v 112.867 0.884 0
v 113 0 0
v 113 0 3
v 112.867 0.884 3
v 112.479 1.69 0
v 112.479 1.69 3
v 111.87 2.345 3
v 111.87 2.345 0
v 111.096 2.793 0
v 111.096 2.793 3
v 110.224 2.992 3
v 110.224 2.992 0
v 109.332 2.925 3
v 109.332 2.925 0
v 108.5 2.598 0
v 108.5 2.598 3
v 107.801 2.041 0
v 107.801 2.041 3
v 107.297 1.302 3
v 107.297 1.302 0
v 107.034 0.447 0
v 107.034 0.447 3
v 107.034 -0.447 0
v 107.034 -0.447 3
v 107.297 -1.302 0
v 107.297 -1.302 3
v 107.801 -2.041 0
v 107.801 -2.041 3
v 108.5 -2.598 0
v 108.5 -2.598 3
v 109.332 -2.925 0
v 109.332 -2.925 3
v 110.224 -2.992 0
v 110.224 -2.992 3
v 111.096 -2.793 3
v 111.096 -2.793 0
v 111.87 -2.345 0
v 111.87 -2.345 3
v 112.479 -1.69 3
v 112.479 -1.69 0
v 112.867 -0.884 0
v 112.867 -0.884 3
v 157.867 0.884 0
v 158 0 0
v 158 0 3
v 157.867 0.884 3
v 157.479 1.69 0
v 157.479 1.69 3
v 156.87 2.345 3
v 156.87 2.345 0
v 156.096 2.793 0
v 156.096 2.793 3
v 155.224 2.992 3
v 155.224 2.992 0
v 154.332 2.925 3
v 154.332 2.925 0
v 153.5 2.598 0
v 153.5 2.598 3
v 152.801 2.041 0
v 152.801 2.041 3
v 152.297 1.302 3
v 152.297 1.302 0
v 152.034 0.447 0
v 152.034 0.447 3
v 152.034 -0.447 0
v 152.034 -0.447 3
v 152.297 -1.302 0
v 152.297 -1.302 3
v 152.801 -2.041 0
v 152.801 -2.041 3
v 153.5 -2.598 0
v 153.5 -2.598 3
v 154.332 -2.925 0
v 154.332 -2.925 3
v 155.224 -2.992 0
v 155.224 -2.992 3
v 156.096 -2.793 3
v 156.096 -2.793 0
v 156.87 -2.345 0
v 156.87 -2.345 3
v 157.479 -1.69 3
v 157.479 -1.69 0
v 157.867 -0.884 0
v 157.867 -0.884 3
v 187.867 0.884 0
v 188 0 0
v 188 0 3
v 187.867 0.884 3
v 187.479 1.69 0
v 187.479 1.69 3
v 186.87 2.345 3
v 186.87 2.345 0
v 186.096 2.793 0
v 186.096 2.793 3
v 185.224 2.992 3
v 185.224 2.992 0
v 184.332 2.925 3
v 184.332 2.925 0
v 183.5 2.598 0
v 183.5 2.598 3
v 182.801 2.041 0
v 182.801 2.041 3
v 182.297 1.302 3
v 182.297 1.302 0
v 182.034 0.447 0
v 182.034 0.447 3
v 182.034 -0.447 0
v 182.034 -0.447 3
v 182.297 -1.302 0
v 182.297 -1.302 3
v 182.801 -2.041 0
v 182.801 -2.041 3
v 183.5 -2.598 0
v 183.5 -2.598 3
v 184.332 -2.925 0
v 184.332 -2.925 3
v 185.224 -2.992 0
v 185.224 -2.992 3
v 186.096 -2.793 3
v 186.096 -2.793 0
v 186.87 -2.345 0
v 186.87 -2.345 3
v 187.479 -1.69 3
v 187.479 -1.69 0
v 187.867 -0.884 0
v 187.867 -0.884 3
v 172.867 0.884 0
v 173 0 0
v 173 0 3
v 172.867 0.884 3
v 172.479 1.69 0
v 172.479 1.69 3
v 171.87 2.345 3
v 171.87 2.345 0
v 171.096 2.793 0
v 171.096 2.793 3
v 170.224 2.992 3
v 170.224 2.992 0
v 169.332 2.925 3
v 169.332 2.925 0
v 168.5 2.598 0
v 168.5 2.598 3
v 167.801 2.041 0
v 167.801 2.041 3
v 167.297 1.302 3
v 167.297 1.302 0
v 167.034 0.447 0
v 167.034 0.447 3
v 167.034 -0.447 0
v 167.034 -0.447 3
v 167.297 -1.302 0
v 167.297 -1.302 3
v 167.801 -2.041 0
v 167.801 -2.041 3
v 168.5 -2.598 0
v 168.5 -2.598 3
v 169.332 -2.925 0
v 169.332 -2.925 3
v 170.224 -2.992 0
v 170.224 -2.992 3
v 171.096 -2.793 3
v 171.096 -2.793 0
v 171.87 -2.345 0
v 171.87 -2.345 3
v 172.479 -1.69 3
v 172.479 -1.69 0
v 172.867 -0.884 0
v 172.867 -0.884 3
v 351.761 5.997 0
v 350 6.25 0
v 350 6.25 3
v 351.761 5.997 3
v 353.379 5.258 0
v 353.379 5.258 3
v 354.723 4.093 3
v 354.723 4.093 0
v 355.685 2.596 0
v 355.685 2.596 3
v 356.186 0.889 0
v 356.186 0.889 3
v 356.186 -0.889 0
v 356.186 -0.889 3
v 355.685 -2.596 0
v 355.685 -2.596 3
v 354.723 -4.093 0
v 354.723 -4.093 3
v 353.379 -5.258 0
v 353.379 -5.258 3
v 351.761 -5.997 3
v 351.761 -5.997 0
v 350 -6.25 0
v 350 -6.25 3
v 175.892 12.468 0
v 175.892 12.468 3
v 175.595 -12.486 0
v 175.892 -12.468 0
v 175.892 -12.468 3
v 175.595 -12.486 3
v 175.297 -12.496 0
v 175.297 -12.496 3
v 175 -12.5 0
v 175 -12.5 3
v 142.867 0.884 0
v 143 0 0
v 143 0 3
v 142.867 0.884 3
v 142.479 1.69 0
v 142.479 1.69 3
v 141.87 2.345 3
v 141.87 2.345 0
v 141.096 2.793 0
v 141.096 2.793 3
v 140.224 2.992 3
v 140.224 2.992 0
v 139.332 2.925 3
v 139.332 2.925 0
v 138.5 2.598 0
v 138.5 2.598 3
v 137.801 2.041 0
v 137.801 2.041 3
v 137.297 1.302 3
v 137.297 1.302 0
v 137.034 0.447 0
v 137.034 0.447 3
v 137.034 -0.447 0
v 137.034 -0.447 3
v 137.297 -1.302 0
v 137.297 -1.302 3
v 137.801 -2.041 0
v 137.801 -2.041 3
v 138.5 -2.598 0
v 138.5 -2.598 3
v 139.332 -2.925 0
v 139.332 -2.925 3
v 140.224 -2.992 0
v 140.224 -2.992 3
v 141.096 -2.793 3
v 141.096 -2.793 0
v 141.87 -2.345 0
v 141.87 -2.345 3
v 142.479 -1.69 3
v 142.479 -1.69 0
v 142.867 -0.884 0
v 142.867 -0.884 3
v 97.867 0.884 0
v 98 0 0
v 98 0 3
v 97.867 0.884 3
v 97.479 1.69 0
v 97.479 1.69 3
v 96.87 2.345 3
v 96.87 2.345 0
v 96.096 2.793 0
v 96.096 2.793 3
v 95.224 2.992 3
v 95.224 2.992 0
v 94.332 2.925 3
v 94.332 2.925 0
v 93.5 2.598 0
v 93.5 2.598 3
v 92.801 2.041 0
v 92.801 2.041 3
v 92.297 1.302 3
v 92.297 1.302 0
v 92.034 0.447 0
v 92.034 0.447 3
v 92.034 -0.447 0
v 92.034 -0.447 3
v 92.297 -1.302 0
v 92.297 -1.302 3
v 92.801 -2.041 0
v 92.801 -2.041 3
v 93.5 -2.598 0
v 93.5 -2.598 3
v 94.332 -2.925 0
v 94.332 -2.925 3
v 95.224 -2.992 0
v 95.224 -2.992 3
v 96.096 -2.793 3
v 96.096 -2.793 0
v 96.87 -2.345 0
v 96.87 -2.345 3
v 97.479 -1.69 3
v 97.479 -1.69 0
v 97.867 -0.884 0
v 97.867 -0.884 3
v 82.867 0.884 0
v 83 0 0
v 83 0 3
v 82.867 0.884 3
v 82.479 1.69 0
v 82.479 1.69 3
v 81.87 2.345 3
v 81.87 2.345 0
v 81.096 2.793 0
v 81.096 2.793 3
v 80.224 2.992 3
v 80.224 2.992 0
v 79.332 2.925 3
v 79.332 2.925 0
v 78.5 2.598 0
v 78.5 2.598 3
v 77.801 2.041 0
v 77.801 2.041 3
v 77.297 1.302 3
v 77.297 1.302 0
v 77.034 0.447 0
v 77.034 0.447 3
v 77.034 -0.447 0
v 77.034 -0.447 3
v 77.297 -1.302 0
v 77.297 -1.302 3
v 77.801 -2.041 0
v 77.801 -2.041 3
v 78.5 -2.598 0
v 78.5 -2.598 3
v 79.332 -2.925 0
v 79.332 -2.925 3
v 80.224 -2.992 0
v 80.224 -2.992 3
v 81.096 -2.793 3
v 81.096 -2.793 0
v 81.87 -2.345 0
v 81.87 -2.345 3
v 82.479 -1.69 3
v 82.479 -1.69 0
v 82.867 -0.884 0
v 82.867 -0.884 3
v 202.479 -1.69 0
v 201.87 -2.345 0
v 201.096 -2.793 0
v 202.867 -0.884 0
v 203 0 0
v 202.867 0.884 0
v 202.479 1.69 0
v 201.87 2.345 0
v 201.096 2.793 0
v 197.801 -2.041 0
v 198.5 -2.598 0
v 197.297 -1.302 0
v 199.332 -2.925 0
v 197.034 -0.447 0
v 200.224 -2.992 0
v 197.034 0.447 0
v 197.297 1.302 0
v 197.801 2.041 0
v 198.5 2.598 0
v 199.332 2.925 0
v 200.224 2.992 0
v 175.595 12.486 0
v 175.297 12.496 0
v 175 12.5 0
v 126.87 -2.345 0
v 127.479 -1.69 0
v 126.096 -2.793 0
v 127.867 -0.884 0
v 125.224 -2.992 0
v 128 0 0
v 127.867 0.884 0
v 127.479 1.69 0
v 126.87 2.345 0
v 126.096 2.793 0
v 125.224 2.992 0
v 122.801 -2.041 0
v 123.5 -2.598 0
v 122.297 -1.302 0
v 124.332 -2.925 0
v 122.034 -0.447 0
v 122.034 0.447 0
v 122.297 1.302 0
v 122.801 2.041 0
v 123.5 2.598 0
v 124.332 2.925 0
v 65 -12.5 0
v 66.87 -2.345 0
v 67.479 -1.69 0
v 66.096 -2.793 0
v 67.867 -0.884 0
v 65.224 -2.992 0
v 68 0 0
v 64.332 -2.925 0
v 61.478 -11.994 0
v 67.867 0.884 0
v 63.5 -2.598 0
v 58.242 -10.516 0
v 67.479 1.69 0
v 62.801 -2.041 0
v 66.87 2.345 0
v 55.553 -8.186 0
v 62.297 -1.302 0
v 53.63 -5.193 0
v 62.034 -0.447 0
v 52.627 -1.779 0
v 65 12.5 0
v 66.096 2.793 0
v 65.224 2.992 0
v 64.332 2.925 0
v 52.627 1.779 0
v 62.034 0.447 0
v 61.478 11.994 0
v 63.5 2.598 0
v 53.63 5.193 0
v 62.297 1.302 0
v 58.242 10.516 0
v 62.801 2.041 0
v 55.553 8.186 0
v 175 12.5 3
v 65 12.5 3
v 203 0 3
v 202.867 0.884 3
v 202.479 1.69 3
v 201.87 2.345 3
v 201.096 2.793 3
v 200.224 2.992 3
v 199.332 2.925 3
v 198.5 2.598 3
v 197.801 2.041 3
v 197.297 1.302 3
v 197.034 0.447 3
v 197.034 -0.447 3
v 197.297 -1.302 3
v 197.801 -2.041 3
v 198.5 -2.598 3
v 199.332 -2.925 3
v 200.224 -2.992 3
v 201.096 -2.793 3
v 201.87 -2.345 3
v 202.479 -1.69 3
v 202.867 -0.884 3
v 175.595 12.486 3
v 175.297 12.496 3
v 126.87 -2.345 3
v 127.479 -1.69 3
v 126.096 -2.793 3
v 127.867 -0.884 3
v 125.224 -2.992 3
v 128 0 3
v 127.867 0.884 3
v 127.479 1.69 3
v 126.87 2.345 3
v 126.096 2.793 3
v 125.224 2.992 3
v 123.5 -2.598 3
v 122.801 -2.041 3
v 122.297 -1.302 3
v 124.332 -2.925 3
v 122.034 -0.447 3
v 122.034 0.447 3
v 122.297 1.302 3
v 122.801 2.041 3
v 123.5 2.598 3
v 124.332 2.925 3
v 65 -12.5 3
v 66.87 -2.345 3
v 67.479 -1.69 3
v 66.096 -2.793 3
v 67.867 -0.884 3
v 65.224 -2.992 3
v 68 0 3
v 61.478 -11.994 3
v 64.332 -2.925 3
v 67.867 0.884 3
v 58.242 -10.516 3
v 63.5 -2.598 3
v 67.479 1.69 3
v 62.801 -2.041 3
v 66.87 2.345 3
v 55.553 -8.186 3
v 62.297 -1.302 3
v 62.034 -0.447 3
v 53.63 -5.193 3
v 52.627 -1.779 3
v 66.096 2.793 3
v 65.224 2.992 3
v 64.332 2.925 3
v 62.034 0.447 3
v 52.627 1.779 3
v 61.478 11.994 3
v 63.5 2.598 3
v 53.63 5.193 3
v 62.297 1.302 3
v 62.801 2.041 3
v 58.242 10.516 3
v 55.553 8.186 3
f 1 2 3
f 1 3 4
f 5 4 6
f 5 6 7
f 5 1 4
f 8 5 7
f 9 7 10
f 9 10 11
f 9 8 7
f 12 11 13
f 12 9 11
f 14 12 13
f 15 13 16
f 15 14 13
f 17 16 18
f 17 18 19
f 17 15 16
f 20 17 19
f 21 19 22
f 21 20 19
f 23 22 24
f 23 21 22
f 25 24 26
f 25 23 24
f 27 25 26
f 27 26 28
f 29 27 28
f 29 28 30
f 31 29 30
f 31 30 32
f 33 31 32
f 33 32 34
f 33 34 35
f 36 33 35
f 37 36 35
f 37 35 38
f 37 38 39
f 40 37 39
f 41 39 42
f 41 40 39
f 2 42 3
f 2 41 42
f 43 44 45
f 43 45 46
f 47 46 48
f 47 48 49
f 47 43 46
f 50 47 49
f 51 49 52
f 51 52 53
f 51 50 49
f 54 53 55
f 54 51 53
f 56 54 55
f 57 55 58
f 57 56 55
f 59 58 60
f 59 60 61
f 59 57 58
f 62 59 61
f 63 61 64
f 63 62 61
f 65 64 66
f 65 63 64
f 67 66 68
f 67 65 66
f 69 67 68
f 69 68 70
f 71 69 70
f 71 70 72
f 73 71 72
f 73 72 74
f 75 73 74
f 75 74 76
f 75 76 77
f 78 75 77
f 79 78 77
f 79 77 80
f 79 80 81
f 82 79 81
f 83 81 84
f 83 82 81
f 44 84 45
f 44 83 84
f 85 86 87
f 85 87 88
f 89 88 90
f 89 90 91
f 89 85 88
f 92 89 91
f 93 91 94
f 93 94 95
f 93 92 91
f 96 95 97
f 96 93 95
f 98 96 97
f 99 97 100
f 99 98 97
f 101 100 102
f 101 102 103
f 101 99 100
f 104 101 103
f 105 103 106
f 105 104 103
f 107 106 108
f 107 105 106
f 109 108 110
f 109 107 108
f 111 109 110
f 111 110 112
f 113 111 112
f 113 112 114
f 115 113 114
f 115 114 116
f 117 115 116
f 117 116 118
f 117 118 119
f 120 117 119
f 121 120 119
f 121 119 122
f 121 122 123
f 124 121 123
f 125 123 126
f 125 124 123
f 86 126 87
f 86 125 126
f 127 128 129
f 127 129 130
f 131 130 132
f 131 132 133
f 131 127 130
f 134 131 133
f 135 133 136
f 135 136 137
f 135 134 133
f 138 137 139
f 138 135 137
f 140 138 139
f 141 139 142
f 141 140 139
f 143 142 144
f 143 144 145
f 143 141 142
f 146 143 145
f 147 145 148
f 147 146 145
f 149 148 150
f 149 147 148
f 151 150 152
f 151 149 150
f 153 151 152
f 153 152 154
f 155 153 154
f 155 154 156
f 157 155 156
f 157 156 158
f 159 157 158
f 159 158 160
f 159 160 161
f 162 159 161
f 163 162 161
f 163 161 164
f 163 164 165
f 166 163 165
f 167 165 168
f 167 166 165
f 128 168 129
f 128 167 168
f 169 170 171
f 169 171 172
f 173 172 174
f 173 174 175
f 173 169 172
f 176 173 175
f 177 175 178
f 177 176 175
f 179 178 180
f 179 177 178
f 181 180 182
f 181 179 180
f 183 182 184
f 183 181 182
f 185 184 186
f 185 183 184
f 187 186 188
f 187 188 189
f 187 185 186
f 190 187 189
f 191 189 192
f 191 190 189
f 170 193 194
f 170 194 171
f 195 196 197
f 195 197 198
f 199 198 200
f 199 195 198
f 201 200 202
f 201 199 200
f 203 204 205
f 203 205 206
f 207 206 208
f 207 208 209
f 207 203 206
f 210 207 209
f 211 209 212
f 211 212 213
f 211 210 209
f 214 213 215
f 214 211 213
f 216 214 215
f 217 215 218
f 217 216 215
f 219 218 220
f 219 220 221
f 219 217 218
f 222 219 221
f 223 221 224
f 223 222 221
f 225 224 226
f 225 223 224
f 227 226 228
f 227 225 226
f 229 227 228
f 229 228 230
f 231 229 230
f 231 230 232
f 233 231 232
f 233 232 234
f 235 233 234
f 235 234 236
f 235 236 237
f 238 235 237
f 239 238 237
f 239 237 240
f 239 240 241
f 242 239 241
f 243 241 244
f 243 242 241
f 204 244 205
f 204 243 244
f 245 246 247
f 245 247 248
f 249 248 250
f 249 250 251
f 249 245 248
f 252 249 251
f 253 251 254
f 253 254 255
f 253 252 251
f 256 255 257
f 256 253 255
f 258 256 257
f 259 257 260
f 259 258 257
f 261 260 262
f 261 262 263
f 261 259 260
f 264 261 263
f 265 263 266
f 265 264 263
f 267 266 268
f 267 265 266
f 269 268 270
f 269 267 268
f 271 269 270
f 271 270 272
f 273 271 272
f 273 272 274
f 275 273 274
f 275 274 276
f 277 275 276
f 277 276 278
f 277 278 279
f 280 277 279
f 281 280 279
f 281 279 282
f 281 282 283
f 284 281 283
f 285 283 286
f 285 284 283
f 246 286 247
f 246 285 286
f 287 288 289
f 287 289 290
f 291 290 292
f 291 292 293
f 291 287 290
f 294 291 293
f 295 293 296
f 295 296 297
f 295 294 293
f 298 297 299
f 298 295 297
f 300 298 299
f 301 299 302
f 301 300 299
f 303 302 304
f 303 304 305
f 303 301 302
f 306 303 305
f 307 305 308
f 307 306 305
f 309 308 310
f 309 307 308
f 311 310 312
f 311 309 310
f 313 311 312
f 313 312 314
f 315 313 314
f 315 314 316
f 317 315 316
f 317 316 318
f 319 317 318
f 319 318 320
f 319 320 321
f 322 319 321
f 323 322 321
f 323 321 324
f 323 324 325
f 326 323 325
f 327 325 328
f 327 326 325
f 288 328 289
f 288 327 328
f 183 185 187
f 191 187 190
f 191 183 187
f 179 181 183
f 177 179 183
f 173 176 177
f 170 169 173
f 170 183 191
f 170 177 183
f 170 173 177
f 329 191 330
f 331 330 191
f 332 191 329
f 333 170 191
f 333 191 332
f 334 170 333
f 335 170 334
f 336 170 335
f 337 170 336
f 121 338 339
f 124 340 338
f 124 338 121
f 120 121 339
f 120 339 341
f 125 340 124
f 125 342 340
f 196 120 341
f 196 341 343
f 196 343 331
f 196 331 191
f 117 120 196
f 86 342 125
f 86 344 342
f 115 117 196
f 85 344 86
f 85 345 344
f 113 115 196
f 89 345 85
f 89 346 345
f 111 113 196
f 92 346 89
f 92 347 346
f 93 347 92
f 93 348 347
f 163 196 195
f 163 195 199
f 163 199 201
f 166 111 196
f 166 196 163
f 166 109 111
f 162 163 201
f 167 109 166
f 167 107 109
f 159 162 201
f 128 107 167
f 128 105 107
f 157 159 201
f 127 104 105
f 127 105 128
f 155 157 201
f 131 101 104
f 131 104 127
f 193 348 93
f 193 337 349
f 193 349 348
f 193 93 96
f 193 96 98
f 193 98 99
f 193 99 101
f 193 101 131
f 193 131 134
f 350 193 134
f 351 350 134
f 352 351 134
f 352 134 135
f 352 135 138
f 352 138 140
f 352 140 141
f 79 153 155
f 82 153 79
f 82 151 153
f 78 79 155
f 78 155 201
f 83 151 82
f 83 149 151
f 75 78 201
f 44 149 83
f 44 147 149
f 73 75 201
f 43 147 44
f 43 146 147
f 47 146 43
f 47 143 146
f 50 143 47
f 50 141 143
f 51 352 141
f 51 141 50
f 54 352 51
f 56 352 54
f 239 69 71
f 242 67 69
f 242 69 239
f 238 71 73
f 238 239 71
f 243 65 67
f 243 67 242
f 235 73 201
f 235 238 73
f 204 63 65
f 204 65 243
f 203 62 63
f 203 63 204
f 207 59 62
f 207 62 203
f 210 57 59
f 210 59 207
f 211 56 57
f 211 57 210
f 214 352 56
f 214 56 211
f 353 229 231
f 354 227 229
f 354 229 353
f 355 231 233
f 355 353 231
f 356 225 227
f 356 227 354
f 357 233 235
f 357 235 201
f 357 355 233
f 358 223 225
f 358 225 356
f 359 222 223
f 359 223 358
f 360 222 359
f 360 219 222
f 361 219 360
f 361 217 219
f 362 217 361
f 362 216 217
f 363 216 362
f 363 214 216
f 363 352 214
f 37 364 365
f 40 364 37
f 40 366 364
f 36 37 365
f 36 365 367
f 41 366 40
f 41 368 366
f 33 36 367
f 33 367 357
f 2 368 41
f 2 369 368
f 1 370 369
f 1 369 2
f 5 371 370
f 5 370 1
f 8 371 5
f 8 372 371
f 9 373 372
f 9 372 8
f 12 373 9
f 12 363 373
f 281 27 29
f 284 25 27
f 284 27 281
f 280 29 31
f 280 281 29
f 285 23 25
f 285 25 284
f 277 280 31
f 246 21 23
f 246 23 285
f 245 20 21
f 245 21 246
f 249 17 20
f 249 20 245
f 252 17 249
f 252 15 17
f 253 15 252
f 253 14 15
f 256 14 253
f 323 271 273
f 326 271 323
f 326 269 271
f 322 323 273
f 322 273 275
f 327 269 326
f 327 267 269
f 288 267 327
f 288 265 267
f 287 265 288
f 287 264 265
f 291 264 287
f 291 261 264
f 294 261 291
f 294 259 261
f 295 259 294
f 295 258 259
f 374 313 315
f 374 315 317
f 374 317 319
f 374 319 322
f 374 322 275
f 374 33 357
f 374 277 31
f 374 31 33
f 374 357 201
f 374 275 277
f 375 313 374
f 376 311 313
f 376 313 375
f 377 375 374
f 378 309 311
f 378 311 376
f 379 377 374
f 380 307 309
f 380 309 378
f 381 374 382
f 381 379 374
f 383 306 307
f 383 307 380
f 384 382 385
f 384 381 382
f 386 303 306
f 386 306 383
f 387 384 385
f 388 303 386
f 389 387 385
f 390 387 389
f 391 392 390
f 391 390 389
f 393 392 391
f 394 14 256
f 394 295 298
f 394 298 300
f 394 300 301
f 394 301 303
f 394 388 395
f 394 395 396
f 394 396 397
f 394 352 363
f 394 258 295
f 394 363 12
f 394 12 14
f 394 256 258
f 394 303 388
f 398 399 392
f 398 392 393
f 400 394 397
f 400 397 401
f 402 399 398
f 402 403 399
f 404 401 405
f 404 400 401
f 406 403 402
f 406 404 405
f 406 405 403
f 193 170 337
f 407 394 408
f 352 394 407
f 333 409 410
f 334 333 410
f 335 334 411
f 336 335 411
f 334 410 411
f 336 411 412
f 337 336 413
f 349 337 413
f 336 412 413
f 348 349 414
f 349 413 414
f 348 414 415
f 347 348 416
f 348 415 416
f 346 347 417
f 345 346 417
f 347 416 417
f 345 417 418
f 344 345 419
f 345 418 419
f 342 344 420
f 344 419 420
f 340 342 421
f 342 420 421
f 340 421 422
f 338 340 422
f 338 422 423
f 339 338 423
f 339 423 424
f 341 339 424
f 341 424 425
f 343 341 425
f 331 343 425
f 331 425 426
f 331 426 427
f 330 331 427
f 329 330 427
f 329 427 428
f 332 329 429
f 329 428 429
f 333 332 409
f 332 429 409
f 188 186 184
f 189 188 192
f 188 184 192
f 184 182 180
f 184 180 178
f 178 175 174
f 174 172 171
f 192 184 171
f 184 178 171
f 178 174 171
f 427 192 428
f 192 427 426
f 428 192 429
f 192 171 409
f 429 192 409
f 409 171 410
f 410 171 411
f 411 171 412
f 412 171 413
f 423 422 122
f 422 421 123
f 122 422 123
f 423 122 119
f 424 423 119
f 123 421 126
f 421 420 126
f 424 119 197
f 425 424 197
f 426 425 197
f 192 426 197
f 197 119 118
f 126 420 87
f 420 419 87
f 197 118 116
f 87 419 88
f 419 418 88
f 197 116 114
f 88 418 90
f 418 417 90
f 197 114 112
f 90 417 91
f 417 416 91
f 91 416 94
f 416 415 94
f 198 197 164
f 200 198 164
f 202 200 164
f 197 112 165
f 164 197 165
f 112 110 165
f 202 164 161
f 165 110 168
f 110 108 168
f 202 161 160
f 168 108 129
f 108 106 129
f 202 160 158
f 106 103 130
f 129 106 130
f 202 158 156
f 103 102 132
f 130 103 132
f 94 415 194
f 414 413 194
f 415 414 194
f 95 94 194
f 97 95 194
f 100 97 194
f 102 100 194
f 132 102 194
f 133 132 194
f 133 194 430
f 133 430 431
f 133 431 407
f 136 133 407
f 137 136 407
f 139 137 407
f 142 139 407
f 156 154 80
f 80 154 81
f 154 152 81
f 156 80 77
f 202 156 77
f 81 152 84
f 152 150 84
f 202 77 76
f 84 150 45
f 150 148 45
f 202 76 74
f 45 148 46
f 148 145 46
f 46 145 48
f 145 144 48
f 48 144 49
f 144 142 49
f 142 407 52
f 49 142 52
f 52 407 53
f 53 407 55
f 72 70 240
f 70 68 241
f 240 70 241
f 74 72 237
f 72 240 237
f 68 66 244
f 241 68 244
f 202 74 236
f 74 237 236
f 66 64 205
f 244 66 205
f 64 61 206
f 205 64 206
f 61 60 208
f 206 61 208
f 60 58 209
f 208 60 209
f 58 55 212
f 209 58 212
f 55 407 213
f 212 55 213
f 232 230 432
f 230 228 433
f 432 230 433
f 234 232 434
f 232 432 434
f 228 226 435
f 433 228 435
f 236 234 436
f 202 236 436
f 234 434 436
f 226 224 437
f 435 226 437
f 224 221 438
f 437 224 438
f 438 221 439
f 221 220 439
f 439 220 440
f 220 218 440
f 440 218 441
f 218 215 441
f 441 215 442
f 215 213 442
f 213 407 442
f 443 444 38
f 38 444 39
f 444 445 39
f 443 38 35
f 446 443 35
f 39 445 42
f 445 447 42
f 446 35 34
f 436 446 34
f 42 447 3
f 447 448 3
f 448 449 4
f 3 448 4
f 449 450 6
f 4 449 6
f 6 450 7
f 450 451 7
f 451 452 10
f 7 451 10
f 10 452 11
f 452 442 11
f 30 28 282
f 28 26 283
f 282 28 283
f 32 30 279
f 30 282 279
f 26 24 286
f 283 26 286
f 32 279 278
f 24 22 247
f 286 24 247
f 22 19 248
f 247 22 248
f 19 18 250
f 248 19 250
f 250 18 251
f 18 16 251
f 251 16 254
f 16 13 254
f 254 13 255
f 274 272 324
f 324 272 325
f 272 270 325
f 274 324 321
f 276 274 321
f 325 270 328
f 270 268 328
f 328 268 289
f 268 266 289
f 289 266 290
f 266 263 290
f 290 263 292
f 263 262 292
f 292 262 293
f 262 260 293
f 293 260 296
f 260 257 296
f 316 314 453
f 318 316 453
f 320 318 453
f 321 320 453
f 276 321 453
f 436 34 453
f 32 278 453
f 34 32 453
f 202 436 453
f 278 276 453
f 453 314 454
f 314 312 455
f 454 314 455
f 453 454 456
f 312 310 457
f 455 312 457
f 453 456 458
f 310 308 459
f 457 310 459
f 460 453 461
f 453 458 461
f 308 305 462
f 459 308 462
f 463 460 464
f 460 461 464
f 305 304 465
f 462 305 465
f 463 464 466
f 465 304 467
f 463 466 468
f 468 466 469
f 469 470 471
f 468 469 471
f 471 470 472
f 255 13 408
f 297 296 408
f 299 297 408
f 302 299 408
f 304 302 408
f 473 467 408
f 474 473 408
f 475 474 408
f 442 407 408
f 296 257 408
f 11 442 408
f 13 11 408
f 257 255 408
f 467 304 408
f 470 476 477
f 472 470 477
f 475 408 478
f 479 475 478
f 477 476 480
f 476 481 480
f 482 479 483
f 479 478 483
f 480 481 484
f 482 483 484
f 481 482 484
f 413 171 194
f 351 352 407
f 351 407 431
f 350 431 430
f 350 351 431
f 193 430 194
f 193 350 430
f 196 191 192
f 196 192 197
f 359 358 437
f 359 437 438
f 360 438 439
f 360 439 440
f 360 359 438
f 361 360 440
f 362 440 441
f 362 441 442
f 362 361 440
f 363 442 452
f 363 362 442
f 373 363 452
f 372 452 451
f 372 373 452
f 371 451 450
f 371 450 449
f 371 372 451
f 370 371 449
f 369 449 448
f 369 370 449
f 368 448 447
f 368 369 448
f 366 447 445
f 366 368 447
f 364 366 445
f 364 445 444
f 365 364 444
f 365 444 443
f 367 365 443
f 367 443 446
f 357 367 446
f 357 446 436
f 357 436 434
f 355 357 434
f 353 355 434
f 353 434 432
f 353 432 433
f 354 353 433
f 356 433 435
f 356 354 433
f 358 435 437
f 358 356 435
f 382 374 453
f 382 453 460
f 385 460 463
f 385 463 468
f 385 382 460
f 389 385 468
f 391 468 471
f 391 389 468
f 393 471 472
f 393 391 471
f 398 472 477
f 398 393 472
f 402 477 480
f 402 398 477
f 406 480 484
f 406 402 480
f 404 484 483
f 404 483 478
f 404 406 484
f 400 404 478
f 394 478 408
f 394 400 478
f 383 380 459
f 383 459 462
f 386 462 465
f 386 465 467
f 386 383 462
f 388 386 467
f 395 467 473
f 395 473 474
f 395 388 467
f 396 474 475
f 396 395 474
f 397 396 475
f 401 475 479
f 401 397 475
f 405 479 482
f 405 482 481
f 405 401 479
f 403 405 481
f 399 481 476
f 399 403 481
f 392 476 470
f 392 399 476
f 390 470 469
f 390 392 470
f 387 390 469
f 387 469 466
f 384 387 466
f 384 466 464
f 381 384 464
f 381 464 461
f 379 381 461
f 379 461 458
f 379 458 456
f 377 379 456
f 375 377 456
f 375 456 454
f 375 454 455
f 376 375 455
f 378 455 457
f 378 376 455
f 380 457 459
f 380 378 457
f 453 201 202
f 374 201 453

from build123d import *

# Parameters (mm, degrees)
SKETCH1_R           = 3
BOSS_EXTRUDE1_DEPTH = 3
SKETCH2_R           = 3
CUT_EXTRUDE1_DEPTH  = 3


with BuildPart() as part:
    # Sketch1 → Boss-Extrude1 (new body)
    with BuildSketch(Plane.XY):
        with BuildLine():
            Line((175.891719745, 12.468152866), (350, 6.25))
            ThreePointArc((350, 6.25), (356.25, 0), (350, -6.25))
            Line((350, -6.25), (175.891719745, -12.468152866))
            ThreePointArc((175.891719745, -12.468152866), (175.446144131, -12.492035679), (175, -12.5))
            Line((175, -12.5), (65, -12.5))
            ThreePointArc((65, -12.5), (52.5, 0), (65, 12.5))
            Line((65, 12.5), (175, 12.5))
            ThreePointArc((175, 12.5), (175.446144131, 12.492035679), (175.891719745, 12.468152866))
        make_face()
        with Locations((65, 0)):
            Circle(SKETCH1_R, mode=Mode.SUBTRACT)
        with Locations((80, 0)):
            Circle(SKETCH1_R, mode=Mode.SUBTRACT)
        with Locations((95, 0)):
            Circle(SKETCH1_R, mode=Mode.SUBTRACT)
        with Locations((110, 0)):
            Circle(SKETCH1_R, mode=Mode.SUBTRACT)
        with Locations((125, 0)):
            Circle(SKETCH1_R, mode=Mode.SUBTRACT)
        with Locations((140, 0)):
            Circle(SKETCH1_R, mode=Mode.SUBTRACT)
        with Locations((155, 0)):
            Circle(SKETCH1_R, mode=Mode.SUBTRACT)
        with Locations((170, 0)):
            Circle(SKETCH1_R, mode=Mode.SUBTRACT)
        with Locations((185, 0)):
            Circle(SKETCH1_R, mode=Mode.SUBTRACT)
    extrude(amount=BOSS_EXTRUDE1_DEPTH)

    # Sketch2 → Cut-Extrude1 (cut)
    with BuildSketch(Plane.XY.offset(3)):
        with Locations((200, 0)):
            Circle(SKETCH2_R)
    extrude(amount=-CUT_EXTRUDE1_DEPTH, mode=Mode.SUBTRACT)


solid = part.part
